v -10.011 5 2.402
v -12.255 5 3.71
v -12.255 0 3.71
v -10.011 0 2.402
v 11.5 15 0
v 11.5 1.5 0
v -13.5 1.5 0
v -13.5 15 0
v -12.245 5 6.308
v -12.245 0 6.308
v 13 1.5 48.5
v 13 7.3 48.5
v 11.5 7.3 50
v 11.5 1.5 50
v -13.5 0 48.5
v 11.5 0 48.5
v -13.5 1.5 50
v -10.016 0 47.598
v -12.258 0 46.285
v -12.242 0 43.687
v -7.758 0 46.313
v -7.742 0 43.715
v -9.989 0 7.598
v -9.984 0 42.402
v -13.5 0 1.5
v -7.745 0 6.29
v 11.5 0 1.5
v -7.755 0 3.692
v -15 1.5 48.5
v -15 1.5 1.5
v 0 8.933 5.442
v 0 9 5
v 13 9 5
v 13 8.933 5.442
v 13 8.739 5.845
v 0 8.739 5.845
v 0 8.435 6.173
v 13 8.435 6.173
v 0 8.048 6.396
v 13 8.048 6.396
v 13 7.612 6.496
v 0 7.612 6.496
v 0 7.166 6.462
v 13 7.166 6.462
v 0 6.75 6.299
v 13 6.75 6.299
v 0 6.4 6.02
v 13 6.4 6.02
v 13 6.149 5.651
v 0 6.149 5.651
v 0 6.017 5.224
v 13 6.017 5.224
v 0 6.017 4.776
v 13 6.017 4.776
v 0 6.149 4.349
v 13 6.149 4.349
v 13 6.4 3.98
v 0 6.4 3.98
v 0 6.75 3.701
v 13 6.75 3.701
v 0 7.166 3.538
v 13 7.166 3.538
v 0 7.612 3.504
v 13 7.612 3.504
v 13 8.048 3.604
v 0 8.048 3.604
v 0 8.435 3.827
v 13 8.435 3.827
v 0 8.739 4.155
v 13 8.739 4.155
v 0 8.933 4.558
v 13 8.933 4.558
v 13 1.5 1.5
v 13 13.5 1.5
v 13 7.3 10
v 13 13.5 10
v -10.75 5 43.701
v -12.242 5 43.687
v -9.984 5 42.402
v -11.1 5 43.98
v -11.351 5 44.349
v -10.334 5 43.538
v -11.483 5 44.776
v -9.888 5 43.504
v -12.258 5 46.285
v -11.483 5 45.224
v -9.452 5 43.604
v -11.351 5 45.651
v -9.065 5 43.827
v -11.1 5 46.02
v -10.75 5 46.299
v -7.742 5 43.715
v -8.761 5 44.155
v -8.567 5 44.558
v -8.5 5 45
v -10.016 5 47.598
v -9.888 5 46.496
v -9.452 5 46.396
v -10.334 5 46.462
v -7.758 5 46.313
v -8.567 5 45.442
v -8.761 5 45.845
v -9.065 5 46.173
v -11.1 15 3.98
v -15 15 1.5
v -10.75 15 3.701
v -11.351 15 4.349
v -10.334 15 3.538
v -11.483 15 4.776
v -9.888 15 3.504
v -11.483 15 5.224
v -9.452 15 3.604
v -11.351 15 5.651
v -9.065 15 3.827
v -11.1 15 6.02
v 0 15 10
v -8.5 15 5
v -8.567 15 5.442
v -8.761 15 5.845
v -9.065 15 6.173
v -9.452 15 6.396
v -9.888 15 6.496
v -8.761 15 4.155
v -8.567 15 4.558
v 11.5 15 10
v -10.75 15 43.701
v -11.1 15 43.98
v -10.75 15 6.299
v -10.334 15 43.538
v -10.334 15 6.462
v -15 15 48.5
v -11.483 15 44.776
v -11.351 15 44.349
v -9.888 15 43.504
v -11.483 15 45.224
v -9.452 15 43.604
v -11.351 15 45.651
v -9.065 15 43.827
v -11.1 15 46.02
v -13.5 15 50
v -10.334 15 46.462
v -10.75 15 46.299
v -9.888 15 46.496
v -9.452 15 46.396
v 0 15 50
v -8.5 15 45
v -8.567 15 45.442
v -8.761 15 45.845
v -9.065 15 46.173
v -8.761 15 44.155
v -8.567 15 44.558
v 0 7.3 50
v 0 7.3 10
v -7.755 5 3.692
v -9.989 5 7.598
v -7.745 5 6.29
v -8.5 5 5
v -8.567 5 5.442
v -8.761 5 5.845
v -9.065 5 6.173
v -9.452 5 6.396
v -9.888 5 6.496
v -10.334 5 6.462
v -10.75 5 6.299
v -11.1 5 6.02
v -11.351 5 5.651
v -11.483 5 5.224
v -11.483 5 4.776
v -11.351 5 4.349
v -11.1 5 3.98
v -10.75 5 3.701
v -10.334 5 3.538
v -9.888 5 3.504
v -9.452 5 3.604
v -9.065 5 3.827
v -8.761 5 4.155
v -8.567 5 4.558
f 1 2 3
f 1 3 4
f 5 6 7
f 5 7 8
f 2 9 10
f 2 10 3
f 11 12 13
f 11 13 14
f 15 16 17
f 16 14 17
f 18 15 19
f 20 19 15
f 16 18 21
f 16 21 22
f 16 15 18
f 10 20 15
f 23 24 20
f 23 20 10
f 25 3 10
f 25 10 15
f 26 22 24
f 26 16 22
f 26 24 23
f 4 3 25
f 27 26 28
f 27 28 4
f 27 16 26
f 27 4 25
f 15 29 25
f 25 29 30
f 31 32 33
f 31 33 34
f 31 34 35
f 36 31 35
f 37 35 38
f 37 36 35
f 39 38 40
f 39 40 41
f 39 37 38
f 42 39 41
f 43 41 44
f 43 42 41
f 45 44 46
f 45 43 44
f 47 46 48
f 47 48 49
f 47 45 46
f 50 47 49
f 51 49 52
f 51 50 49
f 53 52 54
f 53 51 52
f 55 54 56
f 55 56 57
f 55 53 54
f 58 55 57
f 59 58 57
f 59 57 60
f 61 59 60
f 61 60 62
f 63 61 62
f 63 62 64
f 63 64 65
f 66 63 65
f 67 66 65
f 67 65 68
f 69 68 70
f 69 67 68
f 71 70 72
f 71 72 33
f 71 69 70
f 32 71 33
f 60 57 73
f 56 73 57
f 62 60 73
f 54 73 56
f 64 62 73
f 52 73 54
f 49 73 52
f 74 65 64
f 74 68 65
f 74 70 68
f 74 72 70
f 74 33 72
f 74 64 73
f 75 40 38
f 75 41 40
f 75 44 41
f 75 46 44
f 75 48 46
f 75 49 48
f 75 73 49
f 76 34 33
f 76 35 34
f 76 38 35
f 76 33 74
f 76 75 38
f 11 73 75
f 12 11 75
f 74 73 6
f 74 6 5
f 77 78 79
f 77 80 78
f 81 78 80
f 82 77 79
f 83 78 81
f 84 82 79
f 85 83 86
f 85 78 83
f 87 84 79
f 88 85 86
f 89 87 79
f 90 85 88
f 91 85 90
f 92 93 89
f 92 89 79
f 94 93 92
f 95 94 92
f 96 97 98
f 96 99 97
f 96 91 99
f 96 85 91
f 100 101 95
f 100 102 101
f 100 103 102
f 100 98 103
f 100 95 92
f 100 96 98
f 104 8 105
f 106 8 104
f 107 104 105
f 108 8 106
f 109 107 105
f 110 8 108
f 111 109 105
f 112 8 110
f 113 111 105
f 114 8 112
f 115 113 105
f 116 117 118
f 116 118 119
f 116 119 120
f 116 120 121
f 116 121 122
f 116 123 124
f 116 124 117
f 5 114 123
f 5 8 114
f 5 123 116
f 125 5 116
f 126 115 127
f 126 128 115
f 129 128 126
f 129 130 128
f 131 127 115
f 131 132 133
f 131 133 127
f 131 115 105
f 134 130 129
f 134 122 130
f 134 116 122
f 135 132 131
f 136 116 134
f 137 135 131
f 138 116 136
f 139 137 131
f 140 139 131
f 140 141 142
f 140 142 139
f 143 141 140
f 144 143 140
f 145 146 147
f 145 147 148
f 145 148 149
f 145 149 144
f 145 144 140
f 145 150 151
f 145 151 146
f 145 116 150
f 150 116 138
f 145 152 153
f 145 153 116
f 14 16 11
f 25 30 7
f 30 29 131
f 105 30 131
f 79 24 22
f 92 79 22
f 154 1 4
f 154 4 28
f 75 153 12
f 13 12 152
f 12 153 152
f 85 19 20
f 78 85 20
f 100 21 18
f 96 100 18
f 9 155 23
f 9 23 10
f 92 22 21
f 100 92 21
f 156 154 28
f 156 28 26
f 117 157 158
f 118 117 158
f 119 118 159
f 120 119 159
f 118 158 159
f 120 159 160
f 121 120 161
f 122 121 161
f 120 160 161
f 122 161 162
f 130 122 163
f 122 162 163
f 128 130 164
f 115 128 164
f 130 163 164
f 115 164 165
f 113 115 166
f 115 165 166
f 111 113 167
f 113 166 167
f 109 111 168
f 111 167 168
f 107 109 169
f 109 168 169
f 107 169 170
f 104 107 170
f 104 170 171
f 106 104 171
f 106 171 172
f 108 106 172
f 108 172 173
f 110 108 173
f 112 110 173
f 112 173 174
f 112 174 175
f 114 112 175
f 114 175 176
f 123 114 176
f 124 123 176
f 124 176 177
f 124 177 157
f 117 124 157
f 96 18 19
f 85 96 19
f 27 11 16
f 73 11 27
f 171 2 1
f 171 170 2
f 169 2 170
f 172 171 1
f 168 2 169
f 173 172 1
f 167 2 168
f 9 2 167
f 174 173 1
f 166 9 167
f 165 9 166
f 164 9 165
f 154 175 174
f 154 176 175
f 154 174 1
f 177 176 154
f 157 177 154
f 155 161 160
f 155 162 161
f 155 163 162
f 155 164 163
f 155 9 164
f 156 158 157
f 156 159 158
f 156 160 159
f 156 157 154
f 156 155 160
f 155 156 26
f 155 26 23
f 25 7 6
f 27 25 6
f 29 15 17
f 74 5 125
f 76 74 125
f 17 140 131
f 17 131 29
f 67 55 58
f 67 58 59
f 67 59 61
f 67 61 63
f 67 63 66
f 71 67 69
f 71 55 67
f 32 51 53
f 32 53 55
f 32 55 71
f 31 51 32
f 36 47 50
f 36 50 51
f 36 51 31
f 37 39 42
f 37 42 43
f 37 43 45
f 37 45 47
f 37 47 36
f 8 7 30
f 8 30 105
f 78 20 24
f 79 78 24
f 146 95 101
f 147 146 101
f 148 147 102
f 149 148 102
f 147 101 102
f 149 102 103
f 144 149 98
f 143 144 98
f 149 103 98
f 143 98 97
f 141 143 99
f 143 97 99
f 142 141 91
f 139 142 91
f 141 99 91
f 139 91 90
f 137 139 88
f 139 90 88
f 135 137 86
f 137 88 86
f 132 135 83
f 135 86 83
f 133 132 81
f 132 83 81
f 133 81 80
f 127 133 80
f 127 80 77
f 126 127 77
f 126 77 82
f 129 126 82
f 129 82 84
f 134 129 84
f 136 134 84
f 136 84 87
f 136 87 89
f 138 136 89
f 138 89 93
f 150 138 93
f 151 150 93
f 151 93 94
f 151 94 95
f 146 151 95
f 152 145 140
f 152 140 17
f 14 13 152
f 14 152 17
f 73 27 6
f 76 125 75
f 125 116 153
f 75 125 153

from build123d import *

# Parameters (mm, degrees)
F0_R     = 1.5
F1_DEPTH = 13
F0_W     = 7.7
F0_H     = 40
F2_DEPTH = 15
F3_R     = 1.5
F4_DEPTH = 15.001
F5_DEPTH = 5
F6_SIZE  = 1.5


with BuildPart() as f1:
    # F0 (on Right) → F1 (new body)
    with BuildSketch(Plane.YZ):
        Polygon((0, 50), (0, 0), (15, 0), (15, 10), (7.3, 10), (7.3, 50), align=None)
        with Locations((7.5, 5)):
            Circle(F0_R, mode=Mode.SUBTRACT)
    extrude(amount=F1_DEPTH)

    # F0 (on Right) → F2 (join)
    with BuildSketch(Plane.YZ):
        Polygon((0, 50), (0, 0), (15, 0), (15, 10), (7.3, 10), (7.3, 50), align=None)
        with Locations((7.5, 5)):
            Circle(F0_R, mode=Mode.SUBTRACT)
        with Locations((11.15, 30)):
            Rectangle(F0_W, F0_H)
        with Locations((7.5, 5)):
            Circle(F0_R)
    extrude(amount=-F2_DEPTH)

    # F3 (on face) → F4 (cut, through all)
    with BuildSketch(Plane.XZ):
        with Locations((-10, 45)):
            Circle(F3_R)
        with Locations((-10, 5)):
            Circle(F3_R)
    extrude(amount=-F4_DEPTH, mode=Mode.SUBTRACT)

    # F3 (on face) → F5 (cut, symmetric)
    with BuildSketch(Plane.XZ):
        Polygon((-10.010564, 2.401945), (-7.7553, 3.691824), (-7.744737, 6.289879), (-9.989436, 7.598055), (-12.2447, 6.308176), (-12.255263, 3.710121), align=None)
        with Locations((-10, 5)):
            Circle(F3_R, mode=Mode.SUBTRACT)
        Polygon((-7.758047, 46.312877), (-10.016008, 47.598027), (-12.257961, 46.28515), (-12.241953, 43.687123), (-9.983992, 42.401973), (-7.742039, 43.71485), align=None)
        with Locations((-10, 45)):
            Circle(F3_R, mode=Mode.SUBTRACT)
    extrude(amount=F5_DEPTH, both=True, mode=Mode.SUBTRACT)

    # F6
    f6_edges = [f1.edges().sort_by_distance(p)[0] for p in [
        (-15, 0, 25),
        (-1, 0, 50),
        (13, 0, 25),
        (-15, 7.5, 50),
        (-15, 7.5, 0),
        (-1, 0, 0),
        (13, 7.5, 0),
        (13, 3.65, 50),
        (13, 15, 5),
    ]]
    chamfer(f6_edges, length=F6_SIZE)


solid = f1.part
